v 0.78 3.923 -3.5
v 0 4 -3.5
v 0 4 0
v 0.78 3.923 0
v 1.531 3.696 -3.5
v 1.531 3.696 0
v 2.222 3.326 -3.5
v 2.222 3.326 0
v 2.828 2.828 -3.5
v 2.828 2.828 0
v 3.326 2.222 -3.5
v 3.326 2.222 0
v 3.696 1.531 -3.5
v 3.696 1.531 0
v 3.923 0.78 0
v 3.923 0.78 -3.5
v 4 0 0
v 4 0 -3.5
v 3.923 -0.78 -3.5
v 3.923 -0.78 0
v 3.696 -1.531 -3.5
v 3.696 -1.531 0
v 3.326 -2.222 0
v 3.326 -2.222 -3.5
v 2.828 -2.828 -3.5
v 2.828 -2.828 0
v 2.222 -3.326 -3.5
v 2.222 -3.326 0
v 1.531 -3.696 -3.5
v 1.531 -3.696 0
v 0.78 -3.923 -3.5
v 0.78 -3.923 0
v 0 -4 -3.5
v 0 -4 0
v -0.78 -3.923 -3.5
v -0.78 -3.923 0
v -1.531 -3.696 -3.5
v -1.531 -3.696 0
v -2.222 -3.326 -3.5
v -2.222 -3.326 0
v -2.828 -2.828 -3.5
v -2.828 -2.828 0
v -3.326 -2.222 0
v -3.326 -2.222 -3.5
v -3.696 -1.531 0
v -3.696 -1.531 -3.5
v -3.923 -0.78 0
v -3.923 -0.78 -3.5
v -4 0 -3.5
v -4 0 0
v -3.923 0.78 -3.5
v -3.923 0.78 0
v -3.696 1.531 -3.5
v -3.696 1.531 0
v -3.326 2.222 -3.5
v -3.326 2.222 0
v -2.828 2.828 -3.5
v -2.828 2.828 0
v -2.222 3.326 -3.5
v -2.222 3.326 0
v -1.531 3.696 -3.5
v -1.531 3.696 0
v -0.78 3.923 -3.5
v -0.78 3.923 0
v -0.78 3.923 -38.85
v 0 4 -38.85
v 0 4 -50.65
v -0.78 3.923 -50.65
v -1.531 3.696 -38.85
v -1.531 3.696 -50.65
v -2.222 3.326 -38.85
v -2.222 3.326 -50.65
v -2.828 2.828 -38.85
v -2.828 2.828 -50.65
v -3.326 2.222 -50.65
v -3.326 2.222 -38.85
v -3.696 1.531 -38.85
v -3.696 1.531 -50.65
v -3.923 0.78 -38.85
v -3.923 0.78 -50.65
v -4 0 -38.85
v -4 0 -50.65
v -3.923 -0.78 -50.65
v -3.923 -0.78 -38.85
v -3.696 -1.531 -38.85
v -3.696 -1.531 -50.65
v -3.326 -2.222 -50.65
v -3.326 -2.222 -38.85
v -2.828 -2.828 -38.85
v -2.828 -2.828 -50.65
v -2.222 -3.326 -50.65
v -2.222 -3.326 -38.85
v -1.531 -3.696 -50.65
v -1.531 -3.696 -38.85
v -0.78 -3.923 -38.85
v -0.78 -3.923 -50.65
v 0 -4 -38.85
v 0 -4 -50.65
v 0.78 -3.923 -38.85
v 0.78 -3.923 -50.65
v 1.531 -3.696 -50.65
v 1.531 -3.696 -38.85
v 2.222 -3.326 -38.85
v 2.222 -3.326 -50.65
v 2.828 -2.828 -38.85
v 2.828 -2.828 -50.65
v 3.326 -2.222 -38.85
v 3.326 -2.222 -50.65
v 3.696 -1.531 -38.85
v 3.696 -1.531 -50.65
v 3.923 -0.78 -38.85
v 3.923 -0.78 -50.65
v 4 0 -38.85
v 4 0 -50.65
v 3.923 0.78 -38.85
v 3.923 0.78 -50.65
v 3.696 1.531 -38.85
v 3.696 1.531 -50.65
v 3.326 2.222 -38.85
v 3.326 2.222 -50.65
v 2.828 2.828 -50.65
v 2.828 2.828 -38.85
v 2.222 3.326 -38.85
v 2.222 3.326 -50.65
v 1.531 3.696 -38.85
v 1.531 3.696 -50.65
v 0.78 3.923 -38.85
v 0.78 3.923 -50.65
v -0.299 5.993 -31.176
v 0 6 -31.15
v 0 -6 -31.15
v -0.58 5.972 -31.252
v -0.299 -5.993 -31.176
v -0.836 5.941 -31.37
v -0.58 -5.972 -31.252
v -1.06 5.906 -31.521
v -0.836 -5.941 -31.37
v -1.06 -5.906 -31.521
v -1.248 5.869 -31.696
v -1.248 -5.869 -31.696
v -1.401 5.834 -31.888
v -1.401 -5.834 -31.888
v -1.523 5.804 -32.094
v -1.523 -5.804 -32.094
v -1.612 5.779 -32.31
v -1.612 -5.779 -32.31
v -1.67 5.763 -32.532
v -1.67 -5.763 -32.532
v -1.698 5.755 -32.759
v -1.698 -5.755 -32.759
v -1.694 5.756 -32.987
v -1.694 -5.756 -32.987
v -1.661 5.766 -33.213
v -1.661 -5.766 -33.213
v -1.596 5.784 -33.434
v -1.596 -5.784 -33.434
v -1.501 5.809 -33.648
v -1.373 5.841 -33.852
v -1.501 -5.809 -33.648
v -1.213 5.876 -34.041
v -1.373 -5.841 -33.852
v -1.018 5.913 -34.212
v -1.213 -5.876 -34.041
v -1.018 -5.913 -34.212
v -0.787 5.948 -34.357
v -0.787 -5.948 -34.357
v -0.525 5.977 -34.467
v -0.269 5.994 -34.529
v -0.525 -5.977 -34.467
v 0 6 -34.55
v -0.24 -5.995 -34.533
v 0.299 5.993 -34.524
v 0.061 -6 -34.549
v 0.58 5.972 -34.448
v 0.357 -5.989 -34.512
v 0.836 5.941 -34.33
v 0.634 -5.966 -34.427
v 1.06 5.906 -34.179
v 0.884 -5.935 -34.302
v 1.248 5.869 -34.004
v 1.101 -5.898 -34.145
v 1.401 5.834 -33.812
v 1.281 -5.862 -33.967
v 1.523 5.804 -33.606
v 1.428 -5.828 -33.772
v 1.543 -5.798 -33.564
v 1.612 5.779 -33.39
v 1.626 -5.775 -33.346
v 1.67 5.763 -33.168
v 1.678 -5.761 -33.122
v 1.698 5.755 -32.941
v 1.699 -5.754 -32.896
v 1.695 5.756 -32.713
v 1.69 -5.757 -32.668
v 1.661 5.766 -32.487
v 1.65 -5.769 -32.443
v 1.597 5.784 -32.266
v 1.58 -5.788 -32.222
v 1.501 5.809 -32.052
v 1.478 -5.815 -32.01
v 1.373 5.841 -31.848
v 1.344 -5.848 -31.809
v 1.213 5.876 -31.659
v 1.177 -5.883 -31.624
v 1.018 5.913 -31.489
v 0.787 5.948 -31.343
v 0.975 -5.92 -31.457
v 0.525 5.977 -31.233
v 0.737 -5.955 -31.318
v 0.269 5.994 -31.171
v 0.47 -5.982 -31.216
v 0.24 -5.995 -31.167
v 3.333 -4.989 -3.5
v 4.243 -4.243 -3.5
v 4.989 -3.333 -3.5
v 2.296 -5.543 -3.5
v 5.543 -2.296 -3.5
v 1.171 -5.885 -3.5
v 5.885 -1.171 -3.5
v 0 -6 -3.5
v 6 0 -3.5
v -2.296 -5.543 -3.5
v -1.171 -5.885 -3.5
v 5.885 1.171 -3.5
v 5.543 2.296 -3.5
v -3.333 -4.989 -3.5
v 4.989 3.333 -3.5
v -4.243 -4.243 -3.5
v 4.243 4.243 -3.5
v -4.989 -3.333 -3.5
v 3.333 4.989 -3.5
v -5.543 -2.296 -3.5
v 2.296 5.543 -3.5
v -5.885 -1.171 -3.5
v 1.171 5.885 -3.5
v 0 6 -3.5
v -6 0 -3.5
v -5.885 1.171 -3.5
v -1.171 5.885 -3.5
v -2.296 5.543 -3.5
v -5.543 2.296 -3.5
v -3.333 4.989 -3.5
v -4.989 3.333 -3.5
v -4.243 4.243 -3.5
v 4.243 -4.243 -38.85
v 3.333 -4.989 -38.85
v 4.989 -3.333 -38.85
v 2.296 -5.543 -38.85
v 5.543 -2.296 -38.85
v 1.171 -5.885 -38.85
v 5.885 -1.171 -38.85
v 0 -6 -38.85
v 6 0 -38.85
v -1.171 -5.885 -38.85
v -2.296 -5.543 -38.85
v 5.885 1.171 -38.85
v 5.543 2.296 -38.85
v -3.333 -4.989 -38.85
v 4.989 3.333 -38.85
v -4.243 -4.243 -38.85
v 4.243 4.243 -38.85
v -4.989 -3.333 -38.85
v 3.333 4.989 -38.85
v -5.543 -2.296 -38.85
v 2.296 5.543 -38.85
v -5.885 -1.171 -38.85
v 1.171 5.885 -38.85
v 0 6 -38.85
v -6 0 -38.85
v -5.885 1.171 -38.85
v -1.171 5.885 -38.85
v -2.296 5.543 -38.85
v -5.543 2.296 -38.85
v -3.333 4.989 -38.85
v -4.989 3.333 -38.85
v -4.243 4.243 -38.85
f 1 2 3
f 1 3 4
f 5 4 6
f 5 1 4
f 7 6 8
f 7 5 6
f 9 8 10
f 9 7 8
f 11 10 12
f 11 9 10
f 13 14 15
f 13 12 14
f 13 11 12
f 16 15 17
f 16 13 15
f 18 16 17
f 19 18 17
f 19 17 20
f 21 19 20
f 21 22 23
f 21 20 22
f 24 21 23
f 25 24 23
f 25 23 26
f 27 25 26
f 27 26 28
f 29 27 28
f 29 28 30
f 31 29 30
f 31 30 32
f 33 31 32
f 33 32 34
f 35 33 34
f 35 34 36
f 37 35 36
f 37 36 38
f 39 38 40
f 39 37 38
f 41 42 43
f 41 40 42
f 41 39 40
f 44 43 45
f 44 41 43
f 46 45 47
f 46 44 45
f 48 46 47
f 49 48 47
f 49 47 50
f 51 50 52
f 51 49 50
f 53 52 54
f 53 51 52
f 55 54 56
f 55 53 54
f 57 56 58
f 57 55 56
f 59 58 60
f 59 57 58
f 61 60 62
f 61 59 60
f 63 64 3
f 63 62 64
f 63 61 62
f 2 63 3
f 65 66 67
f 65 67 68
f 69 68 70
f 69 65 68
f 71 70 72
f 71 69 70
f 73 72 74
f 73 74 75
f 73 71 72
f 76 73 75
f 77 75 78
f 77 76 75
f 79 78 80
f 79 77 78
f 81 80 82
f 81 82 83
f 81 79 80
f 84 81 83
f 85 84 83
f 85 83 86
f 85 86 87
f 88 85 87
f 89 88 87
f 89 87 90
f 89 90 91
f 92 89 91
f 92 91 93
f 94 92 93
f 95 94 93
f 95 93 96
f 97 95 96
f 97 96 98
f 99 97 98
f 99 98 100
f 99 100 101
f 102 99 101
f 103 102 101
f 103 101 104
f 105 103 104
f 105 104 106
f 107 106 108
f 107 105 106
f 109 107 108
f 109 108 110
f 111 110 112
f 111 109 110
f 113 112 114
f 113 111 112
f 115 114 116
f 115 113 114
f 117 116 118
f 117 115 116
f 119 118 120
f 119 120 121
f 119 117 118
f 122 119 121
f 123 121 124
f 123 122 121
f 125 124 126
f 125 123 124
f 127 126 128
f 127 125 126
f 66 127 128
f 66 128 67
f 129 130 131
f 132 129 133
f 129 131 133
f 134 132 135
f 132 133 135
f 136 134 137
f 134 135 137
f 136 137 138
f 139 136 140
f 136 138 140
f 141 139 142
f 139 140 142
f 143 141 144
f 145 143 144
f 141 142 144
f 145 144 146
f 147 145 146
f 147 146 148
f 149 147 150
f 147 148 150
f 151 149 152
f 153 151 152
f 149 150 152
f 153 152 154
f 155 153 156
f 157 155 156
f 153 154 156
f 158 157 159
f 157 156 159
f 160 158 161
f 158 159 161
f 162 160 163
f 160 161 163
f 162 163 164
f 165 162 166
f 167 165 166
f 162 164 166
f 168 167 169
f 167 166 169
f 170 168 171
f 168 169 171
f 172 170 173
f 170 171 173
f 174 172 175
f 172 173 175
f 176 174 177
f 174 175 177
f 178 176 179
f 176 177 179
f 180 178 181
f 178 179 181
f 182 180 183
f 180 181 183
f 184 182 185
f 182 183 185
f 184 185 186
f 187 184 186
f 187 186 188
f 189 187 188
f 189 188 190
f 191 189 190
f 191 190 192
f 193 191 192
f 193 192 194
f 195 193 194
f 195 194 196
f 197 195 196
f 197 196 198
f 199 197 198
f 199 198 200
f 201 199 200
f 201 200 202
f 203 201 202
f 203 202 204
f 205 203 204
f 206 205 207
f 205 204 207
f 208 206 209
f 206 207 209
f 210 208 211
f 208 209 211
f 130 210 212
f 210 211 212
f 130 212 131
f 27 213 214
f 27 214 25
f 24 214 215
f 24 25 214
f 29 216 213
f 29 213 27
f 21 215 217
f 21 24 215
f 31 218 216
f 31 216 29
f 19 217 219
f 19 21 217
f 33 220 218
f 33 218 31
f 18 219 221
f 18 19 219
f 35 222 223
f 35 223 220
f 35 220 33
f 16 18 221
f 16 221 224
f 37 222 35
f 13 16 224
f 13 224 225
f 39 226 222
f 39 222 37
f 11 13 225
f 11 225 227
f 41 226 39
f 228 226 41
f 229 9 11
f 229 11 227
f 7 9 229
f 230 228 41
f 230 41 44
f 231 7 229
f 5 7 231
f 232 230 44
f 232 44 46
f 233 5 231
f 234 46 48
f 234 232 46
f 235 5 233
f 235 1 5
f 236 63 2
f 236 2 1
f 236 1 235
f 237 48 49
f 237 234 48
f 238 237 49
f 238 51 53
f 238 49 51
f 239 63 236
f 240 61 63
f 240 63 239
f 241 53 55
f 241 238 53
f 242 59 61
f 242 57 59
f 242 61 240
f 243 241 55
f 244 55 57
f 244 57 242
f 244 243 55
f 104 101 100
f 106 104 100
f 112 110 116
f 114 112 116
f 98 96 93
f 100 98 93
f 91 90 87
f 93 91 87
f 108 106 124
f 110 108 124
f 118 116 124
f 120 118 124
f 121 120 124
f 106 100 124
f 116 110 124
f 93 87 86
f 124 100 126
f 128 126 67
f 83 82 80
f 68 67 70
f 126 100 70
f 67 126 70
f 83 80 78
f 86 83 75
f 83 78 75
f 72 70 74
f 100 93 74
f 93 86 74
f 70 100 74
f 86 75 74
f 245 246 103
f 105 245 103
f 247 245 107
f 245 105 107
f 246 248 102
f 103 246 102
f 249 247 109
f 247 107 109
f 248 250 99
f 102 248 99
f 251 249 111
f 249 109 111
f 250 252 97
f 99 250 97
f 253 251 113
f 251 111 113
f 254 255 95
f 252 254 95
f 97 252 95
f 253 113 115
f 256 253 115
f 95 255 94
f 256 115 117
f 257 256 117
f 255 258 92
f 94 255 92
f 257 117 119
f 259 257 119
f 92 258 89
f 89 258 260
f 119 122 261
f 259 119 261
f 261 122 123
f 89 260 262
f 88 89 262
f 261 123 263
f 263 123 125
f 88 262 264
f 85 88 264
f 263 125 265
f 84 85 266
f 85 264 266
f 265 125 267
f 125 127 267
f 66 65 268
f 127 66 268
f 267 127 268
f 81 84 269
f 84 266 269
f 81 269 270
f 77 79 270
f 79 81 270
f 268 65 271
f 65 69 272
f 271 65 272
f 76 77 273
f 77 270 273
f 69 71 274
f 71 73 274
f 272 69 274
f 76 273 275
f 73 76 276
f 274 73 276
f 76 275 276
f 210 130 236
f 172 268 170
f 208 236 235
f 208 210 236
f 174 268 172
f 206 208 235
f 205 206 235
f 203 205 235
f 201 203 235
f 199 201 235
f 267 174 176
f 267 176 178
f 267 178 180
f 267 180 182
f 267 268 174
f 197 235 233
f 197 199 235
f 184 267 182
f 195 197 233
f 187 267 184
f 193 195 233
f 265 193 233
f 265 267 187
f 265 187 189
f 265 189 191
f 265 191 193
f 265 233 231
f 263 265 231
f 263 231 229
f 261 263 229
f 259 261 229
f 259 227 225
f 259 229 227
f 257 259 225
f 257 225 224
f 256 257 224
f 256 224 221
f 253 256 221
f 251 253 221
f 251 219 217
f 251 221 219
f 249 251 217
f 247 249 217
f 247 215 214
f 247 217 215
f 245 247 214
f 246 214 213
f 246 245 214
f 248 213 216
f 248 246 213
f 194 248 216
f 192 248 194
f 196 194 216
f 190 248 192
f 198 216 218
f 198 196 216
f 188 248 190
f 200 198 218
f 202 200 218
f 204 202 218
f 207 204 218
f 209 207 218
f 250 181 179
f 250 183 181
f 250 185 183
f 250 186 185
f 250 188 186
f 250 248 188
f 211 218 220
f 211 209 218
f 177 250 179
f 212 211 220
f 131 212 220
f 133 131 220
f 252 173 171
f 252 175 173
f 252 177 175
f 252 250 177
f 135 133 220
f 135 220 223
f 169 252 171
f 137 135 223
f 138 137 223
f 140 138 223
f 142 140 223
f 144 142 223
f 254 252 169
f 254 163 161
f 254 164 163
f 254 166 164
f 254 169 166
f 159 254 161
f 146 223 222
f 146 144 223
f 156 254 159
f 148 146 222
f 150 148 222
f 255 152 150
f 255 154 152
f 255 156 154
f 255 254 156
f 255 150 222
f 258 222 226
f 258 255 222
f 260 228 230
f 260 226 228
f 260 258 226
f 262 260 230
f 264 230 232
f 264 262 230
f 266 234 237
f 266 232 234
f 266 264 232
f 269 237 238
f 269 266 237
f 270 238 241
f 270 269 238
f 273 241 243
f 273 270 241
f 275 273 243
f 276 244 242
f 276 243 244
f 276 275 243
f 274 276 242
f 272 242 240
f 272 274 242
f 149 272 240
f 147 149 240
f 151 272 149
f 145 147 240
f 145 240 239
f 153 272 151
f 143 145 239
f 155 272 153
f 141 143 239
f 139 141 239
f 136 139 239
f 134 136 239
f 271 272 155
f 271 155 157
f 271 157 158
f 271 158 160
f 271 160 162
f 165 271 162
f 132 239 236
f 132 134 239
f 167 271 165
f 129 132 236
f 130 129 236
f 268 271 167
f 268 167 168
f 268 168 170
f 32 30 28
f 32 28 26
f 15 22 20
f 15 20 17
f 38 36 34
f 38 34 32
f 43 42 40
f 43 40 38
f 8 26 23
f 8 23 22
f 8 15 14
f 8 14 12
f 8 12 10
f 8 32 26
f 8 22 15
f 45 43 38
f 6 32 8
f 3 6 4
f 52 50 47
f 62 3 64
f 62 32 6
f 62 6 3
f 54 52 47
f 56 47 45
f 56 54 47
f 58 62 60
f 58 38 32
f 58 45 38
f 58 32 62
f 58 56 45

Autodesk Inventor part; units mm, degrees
ref_plane "YZ Plane" through (0, 0, 0) normal (1, 0, 0) x (0, 1, 0)
ref_plane "XY Plane" through (0, 0, 0) normal (0, 0, 1) x (1, 0, 0)
sketch "スケッチ2" plane through (0, 0, 0) normal (1, 0, 0) x (0, 1, 0)
  line L0 (0, 0) -> (6, 0)
  line L1 (6, 0) -> (6, -50.65)
  line L2 (6, -50.65) -> (0, -50.65)
  line L3 (0, -50.65) -> (0, 0)
  line L4 (6, 0) -> (4, 0)
  line L5 (4, 0) -> (4, -3.5)
  line L6 (4, -3.5) -> (6, -3.5)
  line L7 (6, -3.5) -> (6, 0)
  line L8 (6, -50.65) -> (4, -50.65)
  line L9 (4, -50.65) -> (4, -38.85)
  line L10 (4, -38.85) -> (6, -38.85)
  line L11 (6, -38.85) -> (6, -50.65)
  dimension "d3" = 6
  dimension "d4" = 50.65
  dimension "d5" = 2
  dimension "d6" = 3.5
  dimension "d7" = 2
  dimension "d8" = 11.8
revolve "回転1" add sketch "スケッチ2" angle 360 about axis through (0, 0, -50.65) along (0, 0, 1) contours L0 L5 L6 L1 L10 L9 L2 L3
ref_plane "作業平面1" through (0, 6, -21.175) normal (0, 1, 0) x (-1, 0, 0)
sketch "スケッチ3" plane through (0, 6, -21.175) normal (0, 1, 0) x (-1, 0, 0)
  line L0 (4, 21.175) -> (-4, 21.175) projected
  point P0 (0, 21.175)
  point P1 (0, -11.675)
  dimension "d10" = 32.85
hole "穴1" at (0, 6, -32.85) direction (0, -1, 0) diameter 3.4 end through all
properties part number "install-encoder-v1-Shaft-E-Shaft" material "アルミニウム 6061"
